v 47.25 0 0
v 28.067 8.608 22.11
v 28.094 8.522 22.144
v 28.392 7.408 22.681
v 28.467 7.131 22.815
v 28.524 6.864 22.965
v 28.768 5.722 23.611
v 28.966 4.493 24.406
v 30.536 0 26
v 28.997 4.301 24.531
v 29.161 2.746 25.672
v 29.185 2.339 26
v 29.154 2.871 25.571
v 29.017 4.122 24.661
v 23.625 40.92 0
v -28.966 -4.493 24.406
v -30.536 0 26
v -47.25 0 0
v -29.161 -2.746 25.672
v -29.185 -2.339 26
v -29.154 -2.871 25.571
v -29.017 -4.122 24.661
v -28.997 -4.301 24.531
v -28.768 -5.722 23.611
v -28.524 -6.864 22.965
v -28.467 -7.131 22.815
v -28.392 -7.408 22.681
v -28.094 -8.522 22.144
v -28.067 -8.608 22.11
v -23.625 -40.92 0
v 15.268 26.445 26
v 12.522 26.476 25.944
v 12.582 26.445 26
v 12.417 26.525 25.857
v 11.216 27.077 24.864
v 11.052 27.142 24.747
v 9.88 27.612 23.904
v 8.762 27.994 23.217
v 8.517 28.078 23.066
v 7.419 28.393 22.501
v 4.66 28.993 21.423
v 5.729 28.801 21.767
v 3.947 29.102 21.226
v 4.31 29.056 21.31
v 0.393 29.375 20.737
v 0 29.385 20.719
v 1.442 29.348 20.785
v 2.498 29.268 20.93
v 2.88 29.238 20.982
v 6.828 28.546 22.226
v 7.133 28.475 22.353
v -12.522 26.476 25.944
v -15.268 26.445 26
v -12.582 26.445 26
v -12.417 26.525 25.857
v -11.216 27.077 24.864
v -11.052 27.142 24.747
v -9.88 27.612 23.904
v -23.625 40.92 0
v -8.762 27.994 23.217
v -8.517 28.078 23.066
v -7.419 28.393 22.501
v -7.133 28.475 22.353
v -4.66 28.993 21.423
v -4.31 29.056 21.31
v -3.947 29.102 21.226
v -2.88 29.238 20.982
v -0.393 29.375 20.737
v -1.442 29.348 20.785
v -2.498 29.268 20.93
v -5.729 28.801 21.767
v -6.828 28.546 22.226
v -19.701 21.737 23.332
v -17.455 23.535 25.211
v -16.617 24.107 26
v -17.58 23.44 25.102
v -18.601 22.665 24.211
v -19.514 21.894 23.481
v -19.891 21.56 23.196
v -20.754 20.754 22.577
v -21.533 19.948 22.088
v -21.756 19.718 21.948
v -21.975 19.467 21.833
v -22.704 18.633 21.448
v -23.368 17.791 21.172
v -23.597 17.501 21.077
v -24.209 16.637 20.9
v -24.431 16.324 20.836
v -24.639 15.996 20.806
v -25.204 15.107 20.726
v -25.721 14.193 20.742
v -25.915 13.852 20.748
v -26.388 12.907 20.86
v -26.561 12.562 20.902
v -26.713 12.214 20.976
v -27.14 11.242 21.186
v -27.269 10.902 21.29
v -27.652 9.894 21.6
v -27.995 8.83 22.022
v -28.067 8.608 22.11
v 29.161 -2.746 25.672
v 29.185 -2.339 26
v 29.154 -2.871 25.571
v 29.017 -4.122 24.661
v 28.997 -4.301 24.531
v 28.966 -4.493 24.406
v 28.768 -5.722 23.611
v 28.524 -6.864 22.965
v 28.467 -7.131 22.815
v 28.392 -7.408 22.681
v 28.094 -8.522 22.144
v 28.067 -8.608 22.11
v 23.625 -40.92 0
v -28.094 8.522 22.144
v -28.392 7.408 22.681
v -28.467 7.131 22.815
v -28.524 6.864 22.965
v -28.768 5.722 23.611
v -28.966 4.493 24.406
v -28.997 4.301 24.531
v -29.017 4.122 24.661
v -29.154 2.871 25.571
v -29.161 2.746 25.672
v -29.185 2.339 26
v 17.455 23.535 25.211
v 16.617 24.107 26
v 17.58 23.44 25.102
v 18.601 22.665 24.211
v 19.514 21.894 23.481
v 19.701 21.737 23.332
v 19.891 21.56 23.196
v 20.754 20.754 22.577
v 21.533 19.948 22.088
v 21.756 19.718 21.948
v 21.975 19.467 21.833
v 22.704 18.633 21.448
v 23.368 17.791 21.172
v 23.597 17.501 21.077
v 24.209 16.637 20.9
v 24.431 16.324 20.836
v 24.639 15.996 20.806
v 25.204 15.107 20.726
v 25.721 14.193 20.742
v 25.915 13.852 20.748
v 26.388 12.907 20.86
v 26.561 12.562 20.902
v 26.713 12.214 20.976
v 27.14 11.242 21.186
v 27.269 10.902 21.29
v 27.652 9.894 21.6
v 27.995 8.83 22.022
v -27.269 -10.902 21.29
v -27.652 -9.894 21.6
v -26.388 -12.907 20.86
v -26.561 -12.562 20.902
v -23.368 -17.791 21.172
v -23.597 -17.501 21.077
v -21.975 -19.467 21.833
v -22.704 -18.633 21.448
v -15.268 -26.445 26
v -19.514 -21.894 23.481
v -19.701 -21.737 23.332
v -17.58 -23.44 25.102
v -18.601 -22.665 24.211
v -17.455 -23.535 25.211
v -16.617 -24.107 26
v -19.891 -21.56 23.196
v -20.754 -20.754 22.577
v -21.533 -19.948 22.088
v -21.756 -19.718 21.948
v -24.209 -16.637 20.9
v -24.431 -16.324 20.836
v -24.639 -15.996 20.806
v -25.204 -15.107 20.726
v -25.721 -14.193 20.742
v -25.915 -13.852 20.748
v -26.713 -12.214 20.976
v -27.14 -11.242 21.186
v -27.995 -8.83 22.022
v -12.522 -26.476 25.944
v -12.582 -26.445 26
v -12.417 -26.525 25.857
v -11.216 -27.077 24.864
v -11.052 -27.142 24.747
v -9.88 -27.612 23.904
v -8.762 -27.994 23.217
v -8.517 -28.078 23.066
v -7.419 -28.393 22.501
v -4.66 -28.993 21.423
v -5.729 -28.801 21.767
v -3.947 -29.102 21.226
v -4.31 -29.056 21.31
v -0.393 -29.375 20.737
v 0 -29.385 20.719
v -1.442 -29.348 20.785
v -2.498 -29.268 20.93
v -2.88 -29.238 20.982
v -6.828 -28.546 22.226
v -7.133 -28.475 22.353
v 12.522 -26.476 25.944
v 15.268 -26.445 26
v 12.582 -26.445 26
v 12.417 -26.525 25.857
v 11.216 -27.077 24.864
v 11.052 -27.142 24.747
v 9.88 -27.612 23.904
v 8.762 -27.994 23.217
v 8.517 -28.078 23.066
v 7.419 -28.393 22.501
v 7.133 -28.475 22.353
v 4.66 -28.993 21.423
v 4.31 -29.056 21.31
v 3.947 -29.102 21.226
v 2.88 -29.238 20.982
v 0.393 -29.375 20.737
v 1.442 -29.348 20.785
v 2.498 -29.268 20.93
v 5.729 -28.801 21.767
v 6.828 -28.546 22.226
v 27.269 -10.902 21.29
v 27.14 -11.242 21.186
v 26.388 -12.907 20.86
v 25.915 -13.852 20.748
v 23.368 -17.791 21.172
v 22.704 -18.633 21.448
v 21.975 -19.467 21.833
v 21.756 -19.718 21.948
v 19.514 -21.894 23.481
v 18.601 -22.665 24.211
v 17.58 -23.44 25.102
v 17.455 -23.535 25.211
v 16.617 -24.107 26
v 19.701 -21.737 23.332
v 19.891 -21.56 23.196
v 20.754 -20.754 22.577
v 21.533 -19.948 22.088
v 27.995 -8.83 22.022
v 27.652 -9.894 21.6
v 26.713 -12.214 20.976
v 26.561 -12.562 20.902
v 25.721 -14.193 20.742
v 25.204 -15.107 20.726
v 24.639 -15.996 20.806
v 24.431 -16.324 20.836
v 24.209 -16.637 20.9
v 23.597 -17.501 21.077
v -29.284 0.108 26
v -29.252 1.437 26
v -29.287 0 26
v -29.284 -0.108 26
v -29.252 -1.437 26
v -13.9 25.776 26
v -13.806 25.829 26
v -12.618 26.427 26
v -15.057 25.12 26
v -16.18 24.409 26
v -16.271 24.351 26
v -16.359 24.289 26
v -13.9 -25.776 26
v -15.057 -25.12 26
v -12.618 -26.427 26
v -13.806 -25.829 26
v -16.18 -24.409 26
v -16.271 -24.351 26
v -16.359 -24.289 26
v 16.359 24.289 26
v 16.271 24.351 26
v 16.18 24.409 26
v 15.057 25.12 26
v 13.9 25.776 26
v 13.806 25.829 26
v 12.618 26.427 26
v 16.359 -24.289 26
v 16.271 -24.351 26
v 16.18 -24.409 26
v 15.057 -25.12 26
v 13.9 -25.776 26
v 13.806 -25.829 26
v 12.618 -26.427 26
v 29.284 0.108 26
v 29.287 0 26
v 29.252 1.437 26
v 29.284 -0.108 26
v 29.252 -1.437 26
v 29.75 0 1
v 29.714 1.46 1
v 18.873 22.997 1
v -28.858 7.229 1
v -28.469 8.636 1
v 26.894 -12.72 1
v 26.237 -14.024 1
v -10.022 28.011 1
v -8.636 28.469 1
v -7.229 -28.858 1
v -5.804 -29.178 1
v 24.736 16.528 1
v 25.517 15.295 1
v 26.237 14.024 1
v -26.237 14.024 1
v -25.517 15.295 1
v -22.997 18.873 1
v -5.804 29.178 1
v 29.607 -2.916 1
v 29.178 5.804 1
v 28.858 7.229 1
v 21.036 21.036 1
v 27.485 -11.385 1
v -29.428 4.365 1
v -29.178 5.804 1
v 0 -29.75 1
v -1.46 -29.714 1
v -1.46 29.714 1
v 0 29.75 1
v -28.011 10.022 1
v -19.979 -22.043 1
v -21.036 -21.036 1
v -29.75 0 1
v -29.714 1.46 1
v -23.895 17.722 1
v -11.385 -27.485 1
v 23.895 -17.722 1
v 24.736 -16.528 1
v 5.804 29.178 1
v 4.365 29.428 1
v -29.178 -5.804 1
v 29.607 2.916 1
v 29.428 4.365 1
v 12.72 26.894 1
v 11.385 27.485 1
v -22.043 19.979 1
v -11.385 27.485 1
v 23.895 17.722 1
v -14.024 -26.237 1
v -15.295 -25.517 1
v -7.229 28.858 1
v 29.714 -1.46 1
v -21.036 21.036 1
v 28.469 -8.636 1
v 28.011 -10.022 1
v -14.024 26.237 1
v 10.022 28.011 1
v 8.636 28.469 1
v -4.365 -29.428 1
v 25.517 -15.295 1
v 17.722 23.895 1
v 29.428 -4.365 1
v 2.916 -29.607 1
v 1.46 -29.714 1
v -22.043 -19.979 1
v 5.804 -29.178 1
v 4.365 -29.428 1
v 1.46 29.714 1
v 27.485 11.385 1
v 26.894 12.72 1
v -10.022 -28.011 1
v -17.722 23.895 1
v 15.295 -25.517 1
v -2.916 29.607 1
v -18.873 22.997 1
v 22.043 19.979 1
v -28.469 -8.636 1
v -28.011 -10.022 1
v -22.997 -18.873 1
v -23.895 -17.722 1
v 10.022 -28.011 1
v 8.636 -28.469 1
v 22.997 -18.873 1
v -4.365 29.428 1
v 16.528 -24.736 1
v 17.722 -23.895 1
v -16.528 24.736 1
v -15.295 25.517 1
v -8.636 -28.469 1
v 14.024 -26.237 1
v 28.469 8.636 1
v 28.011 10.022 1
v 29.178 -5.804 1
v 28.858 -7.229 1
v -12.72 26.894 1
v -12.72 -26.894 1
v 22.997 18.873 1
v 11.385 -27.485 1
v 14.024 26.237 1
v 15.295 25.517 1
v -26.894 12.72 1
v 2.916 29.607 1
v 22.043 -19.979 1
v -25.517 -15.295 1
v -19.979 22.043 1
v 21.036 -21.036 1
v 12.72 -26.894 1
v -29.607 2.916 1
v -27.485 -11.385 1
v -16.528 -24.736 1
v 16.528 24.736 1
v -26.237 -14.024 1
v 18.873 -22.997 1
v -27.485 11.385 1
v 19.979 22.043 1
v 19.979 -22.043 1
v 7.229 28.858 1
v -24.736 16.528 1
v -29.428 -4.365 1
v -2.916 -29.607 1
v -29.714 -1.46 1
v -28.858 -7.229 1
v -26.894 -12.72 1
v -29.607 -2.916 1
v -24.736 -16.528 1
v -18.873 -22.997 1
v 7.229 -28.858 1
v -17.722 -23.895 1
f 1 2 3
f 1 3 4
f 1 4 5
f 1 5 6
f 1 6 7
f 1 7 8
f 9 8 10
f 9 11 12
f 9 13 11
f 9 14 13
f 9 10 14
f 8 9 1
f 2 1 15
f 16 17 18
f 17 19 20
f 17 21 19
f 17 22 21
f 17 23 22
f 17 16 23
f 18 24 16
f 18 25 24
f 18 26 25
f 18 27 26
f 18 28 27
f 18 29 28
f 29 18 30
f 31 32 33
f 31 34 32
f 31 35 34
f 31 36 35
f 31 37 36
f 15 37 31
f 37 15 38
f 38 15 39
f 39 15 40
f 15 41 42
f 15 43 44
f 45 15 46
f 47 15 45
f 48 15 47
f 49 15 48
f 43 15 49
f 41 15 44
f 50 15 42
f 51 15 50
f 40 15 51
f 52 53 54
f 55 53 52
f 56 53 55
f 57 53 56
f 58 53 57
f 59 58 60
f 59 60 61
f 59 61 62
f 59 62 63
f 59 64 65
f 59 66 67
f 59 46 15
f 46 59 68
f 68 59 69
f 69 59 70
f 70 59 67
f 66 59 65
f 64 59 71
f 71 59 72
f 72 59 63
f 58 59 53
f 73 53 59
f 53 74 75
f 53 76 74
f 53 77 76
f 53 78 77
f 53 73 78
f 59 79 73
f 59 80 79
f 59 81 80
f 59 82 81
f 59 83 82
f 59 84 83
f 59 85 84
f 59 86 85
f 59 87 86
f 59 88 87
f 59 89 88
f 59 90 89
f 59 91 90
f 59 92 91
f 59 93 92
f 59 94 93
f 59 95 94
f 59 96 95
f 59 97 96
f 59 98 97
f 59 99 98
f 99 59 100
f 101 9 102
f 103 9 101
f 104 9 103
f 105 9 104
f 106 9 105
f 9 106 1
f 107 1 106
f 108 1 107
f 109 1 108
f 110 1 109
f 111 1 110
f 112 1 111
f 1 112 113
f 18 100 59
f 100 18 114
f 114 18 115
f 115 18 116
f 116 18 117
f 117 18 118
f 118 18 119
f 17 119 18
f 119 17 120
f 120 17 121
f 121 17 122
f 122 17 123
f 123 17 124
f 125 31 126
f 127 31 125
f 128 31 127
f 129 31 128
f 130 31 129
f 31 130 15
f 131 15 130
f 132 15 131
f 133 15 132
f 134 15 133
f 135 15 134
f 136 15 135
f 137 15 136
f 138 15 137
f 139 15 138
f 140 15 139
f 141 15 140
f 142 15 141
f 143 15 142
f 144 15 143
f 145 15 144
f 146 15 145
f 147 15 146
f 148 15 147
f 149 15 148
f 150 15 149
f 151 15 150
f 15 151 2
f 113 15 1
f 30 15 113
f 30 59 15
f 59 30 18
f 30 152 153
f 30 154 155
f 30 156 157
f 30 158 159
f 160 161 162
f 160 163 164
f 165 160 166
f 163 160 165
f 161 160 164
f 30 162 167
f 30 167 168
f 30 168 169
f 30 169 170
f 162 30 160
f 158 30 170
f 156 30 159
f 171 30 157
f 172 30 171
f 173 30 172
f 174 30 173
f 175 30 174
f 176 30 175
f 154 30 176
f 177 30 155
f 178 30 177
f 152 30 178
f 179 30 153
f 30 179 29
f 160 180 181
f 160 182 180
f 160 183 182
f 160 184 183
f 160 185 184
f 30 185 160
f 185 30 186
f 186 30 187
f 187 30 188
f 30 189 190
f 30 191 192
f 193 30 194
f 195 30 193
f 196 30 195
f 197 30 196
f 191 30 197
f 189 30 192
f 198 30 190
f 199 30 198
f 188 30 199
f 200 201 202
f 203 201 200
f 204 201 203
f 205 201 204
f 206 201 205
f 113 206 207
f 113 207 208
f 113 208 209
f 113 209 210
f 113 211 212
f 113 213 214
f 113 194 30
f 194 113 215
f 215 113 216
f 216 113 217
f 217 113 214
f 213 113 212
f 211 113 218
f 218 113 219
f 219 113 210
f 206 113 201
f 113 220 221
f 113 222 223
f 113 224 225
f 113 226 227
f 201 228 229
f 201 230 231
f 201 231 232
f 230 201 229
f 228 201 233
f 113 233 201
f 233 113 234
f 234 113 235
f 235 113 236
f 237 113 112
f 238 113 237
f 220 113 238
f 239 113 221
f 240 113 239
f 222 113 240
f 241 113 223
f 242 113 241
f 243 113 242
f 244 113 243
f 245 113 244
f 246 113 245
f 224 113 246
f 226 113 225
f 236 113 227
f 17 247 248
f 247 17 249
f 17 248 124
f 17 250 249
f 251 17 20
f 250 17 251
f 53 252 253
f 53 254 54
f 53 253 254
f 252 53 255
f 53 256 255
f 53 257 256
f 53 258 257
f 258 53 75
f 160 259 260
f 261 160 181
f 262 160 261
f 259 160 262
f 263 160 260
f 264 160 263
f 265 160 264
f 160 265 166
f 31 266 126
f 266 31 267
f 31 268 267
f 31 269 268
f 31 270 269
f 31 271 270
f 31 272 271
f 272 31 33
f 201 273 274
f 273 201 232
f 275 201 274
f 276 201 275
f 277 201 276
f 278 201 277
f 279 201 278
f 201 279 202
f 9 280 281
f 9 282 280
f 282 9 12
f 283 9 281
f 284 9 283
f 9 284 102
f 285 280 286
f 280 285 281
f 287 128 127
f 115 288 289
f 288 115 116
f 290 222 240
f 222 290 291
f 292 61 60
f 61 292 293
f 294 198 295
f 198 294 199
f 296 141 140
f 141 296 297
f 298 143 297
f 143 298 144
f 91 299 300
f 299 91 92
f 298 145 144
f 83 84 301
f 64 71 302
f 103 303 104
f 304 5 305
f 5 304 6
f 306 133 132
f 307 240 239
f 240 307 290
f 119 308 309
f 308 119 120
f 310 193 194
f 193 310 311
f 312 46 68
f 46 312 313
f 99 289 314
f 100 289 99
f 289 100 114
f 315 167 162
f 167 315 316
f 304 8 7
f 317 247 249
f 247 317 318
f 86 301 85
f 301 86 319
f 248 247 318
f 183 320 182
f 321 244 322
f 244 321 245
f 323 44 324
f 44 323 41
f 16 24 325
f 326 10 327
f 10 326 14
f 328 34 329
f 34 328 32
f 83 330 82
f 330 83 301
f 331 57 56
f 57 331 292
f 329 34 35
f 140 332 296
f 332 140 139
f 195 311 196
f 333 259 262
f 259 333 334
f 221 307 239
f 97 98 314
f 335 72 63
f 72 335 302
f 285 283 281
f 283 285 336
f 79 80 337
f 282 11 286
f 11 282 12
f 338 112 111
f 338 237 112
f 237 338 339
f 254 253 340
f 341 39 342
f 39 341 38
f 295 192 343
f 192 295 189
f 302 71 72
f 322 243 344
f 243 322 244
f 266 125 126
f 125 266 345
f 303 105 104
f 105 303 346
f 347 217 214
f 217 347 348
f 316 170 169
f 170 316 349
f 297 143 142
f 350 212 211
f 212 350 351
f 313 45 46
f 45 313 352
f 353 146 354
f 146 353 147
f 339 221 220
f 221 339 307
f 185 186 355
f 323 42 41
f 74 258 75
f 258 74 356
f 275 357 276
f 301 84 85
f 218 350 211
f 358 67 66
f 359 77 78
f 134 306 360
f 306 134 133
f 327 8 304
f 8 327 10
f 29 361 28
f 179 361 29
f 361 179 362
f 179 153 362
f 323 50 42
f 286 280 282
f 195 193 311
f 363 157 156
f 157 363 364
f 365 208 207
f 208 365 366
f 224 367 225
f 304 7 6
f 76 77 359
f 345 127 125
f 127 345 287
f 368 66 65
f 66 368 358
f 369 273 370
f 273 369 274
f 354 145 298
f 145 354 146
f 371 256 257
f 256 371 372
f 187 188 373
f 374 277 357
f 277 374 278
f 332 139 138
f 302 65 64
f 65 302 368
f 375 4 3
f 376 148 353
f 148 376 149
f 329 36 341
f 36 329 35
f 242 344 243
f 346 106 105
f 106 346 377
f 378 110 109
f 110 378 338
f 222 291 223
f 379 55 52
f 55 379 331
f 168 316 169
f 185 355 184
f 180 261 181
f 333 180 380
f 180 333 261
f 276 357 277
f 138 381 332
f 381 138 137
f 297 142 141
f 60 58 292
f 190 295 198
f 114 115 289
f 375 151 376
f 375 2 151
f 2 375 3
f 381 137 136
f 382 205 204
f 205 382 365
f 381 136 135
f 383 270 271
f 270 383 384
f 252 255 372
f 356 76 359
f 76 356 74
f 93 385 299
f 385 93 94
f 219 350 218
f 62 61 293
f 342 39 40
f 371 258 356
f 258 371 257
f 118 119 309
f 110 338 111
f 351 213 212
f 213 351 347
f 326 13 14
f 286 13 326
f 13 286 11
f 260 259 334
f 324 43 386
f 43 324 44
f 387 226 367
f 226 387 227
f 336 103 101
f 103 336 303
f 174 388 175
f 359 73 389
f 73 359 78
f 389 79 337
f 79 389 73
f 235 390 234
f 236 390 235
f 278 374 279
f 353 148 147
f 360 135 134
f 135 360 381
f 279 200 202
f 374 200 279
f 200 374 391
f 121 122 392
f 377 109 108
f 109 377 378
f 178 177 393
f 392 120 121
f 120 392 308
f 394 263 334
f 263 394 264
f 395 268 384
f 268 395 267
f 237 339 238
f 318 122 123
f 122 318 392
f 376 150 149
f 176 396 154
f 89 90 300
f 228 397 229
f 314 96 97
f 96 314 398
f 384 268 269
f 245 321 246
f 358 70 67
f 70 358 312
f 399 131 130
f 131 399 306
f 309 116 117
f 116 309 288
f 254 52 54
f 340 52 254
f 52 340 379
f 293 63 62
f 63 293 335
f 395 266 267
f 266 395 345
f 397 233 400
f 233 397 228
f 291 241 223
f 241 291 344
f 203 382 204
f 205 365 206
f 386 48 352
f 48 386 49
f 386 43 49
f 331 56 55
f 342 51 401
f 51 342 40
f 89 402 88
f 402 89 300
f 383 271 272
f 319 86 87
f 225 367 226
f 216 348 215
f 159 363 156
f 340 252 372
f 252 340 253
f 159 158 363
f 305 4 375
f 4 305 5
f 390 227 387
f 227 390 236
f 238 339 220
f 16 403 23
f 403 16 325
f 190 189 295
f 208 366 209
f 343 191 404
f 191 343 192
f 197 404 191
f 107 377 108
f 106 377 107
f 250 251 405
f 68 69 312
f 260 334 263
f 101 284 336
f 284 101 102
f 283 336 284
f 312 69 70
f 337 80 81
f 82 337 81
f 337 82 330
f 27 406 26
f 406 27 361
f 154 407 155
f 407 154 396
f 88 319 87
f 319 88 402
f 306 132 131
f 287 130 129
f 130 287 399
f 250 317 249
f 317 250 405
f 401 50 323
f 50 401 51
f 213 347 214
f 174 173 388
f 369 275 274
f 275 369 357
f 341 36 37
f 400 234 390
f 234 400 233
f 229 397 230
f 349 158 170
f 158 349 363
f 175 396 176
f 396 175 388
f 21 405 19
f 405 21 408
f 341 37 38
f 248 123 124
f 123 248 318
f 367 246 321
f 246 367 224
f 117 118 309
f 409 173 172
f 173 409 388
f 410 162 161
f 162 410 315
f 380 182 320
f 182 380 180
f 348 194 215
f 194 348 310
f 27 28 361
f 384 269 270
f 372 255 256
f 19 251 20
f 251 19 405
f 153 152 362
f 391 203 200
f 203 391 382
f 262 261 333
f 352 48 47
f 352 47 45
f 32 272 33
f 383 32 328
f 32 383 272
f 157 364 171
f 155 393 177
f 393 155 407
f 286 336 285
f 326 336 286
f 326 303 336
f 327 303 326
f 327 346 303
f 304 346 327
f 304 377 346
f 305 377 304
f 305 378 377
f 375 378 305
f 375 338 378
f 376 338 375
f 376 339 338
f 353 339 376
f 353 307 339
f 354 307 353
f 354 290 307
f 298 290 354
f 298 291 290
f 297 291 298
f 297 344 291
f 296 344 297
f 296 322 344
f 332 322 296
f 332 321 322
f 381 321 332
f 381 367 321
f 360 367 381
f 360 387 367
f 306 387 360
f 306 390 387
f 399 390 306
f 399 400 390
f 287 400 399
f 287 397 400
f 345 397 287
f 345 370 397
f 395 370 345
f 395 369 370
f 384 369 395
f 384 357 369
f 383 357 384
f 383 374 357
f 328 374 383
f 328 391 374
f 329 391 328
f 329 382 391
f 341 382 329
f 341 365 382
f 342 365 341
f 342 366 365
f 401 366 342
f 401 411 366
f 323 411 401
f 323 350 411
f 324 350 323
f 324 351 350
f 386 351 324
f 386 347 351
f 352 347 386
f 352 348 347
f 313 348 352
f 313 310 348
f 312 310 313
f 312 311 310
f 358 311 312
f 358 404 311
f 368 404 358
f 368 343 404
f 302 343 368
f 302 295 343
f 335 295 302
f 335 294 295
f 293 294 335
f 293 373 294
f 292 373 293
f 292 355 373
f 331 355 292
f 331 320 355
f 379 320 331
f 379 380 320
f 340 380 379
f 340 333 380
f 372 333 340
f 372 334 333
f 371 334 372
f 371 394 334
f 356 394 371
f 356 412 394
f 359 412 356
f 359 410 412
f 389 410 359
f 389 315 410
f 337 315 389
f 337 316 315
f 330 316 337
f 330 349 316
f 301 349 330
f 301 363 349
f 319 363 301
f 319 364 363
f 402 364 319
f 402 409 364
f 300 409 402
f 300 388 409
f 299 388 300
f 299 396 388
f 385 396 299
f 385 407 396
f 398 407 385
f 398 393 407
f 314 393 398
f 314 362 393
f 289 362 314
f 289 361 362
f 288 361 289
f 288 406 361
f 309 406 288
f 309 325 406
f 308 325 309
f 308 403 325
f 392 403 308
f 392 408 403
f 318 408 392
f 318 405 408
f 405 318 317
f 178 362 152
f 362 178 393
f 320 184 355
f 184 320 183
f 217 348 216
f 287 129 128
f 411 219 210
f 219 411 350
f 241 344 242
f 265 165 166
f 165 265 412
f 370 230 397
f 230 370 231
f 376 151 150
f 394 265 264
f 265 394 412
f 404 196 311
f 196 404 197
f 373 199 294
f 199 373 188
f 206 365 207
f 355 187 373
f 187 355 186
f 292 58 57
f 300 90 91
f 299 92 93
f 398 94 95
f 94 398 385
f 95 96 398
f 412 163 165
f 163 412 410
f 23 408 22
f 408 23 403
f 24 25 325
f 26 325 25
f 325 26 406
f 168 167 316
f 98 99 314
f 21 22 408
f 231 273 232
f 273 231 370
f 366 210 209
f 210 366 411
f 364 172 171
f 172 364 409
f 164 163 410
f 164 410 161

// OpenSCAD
inner_d2=58.5;
inner_d1=59.5;

upper_cut=2;

h=25 + upper_cut;


stand_plus_d = 35;

res=128;
outer_res=6;

thickness=1;

difference(){
  cylinder(d1=inner_d1 + stand_plus_d,d2=inner_d2,$fn=outer_res,h=h+thickness);

  translate([0,0,h/2+h+thickness-upper_cut])
  cube([stand_plus_d+max(inner_d1,inner_d2),stand_plus_d+max(inner_d1,inner_d2),h],center=true);

  translate([0,0,thickness])
  cylinder(d1=inner_d1,d2=inner_d2,$fn=res, h=h);


}
